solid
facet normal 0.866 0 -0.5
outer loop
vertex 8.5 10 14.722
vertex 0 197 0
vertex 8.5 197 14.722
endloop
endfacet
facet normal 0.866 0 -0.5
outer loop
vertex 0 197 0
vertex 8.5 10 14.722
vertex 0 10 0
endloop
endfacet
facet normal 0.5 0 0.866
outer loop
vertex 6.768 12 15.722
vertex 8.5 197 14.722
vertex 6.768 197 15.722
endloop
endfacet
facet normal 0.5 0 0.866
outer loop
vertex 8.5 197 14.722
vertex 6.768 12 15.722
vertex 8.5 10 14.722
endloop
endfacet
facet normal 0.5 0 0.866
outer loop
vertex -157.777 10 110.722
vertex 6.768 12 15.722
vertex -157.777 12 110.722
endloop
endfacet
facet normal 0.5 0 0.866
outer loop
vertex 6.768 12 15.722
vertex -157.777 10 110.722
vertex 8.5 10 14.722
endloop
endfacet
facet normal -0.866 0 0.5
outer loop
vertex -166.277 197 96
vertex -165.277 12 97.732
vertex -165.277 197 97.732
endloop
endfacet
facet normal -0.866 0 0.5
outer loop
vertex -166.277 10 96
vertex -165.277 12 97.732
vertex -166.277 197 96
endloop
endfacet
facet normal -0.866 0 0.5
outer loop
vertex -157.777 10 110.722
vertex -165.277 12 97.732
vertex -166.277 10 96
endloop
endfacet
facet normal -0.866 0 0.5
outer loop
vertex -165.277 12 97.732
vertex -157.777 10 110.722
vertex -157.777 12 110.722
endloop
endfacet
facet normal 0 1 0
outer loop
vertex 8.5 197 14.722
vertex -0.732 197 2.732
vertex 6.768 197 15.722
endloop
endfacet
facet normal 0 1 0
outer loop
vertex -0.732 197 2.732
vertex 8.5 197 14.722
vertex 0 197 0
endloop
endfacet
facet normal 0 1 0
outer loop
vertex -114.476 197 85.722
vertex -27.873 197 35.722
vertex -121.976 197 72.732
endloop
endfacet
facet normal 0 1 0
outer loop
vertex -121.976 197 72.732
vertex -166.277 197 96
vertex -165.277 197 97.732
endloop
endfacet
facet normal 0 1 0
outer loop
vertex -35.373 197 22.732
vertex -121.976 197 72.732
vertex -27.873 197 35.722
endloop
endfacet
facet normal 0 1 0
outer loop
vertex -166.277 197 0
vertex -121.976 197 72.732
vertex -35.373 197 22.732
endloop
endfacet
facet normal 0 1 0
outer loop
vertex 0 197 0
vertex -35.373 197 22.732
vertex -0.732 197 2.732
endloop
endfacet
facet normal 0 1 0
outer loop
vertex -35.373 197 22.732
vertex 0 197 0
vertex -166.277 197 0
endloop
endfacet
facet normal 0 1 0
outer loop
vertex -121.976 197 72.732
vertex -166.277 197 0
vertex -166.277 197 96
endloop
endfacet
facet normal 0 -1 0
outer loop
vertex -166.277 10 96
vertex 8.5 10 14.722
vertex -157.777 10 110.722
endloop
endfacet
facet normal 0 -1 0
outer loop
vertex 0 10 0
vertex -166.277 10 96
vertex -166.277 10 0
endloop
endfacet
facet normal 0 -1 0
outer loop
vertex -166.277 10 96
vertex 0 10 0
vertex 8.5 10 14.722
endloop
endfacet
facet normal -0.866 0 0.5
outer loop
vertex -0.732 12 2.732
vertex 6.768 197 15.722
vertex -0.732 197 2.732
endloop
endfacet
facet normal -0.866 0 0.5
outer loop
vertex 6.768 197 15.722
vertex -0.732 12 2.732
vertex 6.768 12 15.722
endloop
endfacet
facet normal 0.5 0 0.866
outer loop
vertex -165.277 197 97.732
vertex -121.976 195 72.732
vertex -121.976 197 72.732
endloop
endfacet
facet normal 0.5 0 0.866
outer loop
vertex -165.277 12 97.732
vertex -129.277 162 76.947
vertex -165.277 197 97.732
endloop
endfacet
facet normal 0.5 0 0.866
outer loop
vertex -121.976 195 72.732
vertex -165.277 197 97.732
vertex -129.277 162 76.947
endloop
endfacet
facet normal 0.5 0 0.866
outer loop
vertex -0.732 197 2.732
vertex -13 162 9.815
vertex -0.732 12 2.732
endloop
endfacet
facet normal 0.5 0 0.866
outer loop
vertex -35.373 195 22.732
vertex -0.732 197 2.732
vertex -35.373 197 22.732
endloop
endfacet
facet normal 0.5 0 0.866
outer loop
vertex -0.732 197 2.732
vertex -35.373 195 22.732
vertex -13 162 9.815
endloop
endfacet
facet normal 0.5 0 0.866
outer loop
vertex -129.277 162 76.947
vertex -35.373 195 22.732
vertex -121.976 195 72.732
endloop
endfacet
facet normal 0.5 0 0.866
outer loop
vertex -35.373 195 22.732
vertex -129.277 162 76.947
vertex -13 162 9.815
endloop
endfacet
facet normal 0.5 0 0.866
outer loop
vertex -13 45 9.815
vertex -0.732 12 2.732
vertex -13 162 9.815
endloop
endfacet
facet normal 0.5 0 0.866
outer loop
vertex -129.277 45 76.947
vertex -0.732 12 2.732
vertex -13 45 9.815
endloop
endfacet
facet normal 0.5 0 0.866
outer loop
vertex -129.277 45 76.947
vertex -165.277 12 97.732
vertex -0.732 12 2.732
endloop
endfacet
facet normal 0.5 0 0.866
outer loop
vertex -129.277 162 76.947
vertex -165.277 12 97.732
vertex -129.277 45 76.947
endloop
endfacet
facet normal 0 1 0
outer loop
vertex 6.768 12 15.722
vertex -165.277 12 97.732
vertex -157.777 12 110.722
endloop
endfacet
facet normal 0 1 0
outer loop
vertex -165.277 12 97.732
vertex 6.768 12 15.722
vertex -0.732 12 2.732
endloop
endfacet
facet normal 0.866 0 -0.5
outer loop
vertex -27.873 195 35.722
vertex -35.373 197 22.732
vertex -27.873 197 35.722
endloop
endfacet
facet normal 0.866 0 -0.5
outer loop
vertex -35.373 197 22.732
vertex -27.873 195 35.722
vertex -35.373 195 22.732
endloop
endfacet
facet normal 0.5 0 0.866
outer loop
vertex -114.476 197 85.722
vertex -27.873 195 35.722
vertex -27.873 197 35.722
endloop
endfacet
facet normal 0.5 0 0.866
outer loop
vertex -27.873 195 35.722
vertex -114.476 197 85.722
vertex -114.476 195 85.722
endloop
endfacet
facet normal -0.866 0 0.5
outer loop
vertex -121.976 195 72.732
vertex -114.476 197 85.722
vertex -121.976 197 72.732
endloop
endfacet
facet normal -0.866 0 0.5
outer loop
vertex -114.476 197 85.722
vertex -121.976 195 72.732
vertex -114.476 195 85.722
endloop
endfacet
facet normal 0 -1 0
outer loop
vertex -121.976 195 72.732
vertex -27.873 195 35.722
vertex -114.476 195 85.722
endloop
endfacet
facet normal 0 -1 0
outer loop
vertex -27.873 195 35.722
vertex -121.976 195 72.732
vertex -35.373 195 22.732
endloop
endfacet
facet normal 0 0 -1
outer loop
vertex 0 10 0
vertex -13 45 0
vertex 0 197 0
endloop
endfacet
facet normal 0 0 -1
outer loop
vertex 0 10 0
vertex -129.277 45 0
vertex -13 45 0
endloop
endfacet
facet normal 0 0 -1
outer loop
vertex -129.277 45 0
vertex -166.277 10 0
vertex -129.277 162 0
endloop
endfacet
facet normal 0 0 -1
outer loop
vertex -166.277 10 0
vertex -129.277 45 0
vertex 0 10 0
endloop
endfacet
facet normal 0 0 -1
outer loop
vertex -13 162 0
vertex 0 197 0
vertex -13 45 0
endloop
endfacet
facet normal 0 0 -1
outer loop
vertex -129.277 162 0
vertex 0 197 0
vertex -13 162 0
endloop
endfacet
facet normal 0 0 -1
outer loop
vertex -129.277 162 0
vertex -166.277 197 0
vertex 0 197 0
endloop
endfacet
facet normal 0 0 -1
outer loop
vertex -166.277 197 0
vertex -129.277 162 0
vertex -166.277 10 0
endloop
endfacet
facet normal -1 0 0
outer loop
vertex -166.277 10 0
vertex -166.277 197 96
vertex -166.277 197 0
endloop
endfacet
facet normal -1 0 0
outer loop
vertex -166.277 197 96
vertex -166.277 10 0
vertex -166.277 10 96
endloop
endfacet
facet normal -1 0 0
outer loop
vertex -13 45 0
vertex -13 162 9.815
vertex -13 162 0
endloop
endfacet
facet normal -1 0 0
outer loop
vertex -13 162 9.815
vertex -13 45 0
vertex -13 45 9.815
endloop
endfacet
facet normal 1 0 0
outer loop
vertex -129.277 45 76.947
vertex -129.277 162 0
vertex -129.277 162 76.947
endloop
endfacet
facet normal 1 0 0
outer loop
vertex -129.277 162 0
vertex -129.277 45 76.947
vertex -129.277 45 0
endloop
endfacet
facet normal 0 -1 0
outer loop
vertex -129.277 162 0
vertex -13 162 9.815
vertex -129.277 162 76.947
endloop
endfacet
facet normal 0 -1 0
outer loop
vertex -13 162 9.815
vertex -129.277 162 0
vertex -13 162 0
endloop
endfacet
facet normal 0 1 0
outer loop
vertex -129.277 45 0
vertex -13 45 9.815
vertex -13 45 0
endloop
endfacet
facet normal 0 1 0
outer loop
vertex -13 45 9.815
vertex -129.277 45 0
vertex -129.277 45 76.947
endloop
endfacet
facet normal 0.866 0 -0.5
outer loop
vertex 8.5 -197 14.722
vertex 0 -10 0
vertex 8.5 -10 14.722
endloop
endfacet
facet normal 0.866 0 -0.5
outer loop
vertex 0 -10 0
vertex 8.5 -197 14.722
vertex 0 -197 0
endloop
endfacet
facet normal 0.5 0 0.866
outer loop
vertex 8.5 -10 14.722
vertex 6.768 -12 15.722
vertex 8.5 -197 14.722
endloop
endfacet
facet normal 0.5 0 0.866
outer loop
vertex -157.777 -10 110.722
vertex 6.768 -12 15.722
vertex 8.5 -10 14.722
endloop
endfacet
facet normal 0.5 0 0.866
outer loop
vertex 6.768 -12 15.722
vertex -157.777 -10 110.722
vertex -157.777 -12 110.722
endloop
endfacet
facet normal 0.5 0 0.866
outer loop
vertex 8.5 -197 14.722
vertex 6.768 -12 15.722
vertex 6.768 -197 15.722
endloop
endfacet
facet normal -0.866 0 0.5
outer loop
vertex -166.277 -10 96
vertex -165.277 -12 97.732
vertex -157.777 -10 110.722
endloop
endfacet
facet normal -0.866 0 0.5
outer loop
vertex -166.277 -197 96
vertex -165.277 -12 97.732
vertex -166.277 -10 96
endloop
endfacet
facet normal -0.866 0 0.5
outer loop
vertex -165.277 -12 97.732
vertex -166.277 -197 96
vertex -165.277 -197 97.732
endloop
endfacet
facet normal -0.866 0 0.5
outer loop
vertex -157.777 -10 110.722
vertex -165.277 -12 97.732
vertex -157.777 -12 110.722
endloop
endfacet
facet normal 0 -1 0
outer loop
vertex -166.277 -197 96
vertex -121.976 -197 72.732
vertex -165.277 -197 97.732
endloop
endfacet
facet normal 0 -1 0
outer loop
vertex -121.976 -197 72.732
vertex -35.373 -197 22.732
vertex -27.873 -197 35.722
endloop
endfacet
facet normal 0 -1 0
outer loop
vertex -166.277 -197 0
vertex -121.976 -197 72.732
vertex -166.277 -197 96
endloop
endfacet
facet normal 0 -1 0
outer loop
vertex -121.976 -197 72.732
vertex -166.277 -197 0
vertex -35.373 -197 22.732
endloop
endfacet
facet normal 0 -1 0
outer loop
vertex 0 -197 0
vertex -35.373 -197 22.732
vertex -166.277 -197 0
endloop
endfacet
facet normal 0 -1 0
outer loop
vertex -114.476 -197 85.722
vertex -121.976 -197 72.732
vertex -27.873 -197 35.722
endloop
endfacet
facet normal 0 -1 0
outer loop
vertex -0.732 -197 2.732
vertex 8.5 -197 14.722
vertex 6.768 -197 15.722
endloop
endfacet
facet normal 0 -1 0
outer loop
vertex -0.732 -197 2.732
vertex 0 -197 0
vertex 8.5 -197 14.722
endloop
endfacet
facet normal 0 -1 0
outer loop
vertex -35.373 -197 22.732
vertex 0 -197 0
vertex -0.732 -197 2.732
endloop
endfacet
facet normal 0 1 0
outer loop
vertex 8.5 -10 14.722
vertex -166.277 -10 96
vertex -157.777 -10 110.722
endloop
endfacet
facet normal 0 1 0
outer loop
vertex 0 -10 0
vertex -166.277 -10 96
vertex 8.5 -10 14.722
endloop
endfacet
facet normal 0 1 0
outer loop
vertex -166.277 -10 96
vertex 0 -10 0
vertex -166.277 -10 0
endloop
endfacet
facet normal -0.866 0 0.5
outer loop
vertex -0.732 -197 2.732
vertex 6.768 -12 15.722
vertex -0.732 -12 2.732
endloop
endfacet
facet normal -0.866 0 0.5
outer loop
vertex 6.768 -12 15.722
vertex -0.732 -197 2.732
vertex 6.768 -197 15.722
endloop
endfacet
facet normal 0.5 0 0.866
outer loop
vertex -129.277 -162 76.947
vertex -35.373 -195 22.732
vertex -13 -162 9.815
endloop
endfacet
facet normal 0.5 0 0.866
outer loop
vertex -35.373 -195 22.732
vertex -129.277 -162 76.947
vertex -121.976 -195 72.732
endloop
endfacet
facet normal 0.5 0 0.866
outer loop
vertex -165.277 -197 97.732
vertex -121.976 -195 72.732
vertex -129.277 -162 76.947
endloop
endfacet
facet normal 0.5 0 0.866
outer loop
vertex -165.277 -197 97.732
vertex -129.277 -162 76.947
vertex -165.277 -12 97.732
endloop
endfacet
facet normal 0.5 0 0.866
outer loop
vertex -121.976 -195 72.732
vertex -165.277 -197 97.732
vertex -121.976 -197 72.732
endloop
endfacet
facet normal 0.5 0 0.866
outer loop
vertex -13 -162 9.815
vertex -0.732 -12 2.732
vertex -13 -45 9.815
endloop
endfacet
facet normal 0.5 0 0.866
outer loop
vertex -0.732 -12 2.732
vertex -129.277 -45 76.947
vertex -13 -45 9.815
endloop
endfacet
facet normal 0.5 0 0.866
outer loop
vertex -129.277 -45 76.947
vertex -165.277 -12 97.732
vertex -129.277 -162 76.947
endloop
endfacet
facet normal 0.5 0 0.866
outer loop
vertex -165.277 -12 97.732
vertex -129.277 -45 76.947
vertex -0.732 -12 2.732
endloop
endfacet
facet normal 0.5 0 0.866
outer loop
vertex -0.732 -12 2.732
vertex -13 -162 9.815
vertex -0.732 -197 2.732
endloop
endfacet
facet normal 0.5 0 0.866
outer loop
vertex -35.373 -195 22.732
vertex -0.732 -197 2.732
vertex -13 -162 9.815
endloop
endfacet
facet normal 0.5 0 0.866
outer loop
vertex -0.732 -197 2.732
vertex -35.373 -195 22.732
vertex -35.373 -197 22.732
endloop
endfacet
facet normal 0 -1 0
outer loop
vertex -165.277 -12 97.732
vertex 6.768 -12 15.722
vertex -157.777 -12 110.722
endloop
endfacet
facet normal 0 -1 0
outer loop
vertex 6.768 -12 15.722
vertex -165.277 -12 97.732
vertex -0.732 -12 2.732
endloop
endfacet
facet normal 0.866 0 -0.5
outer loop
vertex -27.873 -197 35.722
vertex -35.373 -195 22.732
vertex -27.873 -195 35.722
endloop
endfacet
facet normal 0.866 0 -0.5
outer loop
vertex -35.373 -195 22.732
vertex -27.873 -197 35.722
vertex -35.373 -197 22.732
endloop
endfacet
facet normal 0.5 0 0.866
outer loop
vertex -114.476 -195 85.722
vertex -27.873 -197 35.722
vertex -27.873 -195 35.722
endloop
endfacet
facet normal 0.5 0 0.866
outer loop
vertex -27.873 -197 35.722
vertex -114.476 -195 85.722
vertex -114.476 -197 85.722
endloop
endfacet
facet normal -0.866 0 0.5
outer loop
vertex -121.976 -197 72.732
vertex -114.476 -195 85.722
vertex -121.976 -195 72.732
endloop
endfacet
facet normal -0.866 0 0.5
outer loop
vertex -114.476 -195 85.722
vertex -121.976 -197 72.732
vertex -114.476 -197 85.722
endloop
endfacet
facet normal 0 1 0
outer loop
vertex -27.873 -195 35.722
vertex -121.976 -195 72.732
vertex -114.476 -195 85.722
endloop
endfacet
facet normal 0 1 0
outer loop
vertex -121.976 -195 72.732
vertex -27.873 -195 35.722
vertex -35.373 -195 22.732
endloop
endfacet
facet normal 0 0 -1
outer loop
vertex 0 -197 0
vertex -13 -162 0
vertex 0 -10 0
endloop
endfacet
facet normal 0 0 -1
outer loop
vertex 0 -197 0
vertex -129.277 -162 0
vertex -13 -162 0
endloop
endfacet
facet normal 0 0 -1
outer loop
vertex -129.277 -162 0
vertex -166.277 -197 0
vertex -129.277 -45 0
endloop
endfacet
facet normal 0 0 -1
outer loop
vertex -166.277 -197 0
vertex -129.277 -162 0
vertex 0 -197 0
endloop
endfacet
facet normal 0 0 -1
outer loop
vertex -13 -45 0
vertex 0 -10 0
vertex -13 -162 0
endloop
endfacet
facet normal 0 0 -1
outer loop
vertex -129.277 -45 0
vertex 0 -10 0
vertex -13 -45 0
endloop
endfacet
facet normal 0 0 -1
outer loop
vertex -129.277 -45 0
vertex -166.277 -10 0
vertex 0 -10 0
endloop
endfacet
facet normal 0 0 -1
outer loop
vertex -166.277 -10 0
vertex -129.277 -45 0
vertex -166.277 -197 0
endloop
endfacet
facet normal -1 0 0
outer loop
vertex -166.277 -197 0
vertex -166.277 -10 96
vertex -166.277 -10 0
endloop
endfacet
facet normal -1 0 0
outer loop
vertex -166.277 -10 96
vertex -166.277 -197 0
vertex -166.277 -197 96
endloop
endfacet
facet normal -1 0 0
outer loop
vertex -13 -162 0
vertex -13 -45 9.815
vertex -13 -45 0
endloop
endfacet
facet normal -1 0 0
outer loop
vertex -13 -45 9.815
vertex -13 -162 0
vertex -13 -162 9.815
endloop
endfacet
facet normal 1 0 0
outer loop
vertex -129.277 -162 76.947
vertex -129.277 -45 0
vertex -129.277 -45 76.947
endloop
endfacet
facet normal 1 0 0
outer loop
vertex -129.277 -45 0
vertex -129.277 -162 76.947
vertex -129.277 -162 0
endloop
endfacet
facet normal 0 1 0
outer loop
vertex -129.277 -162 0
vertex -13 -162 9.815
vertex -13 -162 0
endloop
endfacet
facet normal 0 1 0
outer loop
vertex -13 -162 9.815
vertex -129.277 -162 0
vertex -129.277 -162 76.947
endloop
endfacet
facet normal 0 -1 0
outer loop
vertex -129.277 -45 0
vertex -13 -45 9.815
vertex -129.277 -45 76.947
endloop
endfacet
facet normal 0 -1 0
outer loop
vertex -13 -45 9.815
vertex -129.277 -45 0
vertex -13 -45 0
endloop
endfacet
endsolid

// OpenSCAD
angle = 30;


// Kinesis Corporation KB800PB-US The Kinesis Freestyle2 
// Keyboard Holder

mm=1;

ins_width=190*mm;
ins_depth=185*mm;
ins_height=15*mm;
top_support_width=100*mm;
thk=2*mm;

out_width=ins_width+thk;
out_depth=ins_depth+thk;
out_height=ins_height+thk;

sup_height=sin(angle)*out_width;
sup_width=cos(angle)*out_width;
sup_depth=out_depth;
   
penny_dia=21*mm;


module ramp(){
    translate([0, 10*mm, 0])
    difference(){
    union(){
        
        rotate([0, angle, 0]){
            translate([-out_width,0,0]){
                difference(){
                    color("red")
                    cube([out_width, out_depth, out_height]);
                    translate([0,thk,thk])
                        cube([ins_width, ins_depth, ins_height]);
                }
                translate([50*mm, out_depth-thk, 0])
                    cube([top_support_width, thk, out_height]);
            }
        }
        
    
        
        difference(){
            translate([-sup_width,0,0])
                cube([sup_width, sup_depth, sup_height]);
                
            rotate([0, -(90-angle), 0])
               cube([sup_width, sup_depth, sup_height*2]);
        
        }
        

    }
    
     //translate([30-sup_width, 20-sup_depth, -10])
     translate([37-sup_width, 35, -10])
        cube([sup_width-50, sup_depth-70, sup_height*2]);
  
    } //difference
    
} // module ramp()



ramp();
mirror([0, 1, 0])
    ramp();
